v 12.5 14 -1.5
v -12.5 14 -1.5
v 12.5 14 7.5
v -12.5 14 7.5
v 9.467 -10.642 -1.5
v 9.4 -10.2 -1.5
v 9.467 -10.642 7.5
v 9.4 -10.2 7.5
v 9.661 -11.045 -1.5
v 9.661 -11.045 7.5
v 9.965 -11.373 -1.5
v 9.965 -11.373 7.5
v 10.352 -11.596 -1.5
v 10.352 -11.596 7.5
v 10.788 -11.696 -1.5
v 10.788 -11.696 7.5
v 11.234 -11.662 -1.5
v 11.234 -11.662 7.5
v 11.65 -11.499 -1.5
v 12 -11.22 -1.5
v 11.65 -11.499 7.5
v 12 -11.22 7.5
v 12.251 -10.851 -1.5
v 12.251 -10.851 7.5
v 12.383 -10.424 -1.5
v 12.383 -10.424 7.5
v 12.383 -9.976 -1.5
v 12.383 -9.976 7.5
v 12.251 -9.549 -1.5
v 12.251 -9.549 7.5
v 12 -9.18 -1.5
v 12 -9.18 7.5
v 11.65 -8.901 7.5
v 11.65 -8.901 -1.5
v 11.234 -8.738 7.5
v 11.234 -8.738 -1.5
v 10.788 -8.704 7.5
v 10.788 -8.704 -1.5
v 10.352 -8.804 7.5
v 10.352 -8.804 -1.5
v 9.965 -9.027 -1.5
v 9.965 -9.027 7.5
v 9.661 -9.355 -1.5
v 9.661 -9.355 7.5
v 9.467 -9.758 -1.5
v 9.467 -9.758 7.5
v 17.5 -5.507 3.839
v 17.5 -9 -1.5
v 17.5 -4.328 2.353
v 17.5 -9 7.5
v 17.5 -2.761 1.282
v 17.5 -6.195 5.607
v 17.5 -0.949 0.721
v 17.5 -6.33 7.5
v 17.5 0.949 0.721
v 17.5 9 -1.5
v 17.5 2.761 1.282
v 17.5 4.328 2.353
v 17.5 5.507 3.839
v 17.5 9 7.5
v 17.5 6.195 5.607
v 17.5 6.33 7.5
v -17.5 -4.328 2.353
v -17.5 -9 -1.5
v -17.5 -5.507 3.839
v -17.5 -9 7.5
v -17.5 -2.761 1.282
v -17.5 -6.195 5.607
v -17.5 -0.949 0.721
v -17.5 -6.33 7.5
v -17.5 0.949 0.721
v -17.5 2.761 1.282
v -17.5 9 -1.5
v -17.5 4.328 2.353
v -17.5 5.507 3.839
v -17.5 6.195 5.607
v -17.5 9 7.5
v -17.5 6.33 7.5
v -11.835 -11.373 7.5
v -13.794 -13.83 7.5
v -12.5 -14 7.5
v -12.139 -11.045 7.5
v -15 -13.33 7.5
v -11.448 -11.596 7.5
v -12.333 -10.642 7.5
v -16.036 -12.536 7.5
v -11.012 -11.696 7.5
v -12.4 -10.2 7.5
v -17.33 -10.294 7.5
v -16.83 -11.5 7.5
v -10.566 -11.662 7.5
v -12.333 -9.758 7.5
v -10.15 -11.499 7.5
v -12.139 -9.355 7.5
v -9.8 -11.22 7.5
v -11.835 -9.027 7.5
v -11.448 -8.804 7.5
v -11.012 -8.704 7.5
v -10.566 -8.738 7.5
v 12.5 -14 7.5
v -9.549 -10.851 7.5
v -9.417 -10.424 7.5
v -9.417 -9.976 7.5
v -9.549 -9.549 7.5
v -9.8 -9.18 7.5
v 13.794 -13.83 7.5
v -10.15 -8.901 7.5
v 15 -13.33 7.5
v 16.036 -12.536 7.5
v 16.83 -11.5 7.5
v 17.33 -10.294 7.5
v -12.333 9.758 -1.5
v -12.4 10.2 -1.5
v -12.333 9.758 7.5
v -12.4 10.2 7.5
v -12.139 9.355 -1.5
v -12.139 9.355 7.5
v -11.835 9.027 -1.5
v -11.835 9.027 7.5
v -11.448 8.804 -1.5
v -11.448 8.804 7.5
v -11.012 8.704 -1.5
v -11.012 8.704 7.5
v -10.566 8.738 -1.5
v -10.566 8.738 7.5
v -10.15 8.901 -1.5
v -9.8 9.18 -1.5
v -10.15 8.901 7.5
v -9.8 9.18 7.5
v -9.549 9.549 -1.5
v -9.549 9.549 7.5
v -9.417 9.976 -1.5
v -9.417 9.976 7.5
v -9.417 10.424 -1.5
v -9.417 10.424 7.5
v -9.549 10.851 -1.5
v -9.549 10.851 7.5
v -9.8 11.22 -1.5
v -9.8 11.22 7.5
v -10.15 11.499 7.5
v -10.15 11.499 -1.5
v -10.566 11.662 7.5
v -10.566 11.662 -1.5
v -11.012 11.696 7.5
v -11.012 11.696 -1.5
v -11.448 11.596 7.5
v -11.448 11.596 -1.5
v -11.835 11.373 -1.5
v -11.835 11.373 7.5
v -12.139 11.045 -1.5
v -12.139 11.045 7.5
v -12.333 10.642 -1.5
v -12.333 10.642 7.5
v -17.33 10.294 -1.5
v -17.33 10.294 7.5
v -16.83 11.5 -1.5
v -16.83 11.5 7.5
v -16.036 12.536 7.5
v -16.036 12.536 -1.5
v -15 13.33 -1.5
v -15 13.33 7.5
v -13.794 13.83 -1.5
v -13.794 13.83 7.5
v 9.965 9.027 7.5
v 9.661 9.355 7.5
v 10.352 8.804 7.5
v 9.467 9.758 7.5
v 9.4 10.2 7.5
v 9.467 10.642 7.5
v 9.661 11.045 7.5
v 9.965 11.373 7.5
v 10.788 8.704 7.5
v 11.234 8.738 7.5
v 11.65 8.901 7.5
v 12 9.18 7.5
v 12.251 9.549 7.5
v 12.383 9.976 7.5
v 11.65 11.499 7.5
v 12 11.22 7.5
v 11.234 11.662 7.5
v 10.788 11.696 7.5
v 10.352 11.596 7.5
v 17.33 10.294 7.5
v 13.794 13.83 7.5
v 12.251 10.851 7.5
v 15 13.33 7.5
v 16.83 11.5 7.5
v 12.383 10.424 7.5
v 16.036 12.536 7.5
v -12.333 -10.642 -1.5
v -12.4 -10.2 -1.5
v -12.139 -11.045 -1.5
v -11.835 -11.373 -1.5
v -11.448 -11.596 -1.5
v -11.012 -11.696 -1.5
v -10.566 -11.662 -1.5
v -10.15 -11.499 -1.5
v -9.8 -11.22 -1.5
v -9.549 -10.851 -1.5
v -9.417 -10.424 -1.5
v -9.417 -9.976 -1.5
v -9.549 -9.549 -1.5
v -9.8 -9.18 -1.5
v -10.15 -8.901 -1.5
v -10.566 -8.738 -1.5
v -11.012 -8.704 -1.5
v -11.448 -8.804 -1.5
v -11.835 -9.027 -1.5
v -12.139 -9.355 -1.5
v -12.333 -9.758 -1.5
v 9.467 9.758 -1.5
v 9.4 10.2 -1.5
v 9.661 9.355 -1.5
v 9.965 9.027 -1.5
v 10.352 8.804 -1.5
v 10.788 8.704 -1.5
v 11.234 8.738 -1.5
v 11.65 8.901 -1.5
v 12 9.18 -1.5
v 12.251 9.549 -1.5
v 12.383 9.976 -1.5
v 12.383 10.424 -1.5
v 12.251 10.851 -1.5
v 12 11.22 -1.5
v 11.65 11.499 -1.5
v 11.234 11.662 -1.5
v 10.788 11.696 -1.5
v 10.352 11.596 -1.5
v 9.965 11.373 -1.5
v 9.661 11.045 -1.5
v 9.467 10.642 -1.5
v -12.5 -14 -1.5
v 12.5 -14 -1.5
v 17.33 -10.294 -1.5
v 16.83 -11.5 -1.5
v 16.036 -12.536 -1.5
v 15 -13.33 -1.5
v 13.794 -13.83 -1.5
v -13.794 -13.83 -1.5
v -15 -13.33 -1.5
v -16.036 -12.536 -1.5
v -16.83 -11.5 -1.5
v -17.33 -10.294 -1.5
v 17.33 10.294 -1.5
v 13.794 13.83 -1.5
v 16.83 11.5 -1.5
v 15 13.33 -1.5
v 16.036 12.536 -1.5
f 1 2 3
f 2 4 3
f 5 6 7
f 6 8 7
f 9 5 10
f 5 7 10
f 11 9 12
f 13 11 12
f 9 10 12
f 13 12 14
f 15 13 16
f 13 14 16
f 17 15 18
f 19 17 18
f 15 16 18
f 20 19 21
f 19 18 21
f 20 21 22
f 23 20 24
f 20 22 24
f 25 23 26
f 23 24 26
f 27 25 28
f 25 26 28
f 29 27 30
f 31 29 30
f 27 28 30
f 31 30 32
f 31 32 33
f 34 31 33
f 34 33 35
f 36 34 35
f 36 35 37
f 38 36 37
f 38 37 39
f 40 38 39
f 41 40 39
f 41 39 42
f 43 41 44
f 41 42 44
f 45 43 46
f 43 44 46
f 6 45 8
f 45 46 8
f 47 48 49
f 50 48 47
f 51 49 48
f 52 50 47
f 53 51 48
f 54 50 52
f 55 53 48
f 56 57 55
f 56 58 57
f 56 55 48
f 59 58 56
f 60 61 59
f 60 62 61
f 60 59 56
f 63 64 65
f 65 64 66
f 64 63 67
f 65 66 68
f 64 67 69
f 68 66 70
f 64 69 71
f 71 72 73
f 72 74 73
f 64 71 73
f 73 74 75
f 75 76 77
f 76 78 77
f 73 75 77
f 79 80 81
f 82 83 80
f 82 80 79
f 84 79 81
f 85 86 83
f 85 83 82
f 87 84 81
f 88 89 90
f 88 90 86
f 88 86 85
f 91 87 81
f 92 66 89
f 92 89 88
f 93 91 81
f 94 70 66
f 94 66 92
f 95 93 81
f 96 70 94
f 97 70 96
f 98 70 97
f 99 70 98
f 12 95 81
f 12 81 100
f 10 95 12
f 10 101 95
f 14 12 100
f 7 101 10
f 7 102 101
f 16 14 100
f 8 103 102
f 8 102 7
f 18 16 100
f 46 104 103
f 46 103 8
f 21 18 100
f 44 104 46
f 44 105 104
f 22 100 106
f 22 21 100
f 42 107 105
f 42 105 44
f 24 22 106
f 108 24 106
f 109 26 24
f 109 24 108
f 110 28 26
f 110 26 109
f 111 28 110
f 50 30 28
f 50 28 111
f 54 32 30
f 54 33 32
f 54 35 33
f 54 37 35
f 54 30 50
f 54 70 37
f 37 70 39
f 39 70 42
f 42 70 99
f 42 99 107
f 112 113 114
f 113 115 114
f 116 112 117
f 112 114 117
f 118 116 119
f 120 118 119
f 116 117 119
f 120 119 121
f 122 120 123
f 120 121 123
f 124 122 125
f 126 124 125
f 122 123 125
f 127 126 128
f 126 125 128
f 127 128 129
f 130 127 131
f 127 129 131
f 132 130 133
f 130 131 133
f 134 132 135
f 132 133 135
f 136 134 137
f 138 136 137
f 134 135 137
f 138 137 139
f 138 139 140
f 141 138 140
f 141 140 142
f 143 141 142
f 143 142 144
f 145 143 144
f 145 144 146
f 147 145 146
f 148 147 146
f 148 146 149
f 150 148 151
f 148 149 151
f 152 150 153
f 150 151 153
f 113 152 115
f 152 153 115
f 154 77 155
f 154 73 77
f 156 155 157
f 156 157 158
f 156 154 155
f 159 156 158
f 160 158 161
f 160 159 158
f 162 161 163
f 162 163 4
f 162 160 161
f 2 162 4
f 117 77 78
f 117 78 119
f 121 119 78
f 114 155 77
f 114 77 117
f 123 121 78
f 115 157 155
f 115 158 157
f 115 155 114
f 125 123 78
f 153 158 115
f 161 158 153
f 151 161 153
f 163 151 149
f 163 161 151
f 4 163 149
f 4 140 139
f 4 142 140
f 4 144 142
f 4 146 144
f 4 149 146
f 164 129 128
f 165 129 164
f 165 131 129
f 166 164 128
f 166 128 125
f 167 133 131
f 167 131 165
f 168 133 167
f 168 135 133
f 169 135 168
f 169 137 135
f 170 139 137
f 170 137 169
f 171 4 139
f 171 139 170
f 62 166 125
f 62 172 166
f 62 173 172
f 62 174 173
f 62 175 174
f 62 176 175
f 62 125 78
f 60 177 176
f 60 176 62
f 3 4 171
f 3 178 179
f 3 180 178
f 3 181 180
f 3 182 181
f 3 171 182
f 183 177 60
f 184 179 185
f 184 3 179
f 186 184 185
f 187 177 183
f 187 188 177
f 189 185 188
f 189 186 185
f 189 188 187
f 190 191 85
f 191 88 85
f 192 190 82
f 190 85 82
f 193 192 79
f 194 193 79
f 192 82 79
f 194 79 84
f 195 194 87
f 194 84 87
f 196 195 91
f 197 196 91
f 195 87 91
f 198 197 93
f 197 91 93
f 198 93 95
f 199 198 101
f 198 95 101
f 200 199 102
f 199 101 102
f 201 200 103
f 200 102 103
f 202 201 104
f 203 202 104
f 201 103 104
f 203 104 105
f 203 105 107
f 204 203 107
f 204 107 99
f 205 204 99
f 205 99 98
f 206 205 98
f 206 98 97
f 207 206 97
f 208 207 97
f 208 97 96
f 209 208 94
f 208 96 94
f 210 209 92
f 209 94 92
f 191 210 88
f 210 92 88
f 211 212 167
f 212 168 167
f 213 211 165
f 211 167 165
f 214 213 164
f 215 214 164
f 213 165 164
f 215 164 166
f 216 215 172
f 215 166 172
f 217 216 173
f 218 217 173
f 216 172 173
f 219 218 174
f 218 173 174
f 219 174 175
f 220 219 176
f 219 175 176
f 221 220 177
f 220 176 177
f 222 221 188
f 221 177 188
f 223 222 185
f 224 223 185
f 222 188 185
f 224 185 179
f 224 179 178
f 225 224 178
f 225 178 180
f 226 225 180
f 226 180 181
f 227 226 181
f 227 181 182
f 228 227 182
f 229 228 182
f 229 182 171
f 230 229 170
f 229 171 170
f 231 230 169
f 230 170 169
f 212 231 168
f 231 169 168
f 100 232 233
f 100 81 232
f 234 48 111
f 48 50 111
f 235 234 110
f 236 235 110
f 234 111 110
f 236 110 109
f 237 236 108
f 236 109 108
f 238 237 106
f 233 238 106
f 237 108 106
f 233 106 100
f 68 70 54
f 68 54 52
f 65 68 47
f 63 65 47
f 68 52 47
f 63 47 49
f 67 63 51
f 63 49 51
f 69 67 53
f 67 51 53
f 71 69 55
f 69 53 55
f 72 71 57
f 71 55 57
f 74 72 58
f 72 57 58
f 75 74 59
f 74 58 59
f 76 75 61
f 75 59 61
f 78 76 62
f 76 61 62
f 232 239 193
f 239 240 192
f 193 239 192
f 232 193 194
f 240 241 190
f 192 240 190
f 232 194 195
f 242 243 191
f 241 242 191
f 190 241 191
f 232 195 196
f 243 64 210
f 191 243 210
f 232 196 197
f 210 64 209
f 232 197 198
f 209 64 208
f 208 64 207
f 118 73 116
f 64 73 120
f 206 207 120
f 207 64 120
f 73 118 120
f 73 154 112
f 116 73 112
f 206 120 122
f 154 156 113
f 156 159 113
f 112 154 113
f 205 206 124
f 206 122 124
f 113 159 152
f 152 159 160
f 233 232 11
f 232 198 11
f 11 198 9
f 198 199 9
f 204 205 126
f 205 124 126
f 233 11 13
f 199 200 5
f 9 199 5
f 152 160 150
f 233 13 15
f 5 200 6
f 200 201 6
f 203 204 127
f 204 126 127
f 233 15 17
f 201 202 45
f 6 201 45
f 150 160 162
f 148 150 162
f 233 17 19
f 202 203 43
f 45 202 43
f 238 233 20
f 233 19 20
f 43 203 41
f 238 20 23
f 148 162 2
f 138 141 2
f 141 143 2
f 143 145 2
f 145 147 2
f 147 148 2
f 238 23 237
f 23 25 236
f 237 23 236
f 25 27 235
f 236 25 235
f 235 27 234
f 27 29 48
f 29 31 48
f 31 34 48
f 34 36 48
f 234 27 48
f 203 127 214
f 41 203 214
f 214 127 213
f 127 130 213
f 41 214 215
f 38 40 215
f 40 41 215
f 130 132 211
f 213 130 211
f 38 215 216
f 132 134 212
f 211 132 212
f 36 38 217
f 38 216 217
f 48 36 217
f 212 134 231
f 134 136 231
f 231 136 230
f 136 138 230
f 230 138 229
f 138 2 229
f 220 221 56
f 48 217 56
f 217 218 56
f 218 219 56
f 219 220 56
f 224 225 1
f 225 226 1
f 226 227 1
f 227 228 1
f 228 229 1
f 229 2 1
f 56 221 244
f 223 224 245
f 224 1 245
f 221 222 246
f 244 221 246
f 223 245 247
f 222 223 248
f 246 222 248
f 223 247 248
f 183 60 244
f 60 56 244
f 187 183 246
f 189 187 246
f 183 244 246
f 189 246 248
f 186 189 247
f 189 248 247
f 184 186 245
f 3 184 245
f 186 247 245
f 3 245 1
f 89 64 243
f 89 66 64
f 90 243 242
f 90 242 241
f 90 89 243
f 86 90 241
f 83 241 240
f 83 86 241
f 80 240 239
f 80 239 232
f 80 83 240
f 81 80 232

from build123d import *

# Parameters (mm, degrees)
F0_W     = 35
F0_H     = 28
F1_DEPTH = 14
F3_D     = 12.7
F4_DEPTH = 6.5
F5_D     = 3
F6_DEPTH = 1.5
F7_R     = 5


with BuildPart() as f1:
    # F0 (on Top) → F1 (new body)
    with BuildSketch(Plane.XY):
        Rectangle(F0_W, F0_H)
    extrude(amount=F1_DEPTH)

    # F3 (through all)
    with Locations(Plane(origin=(-17.5, 0, 0), x_dir=(0, -1, 0), z_dir=(-1, 0, 0))):
        with Locations((0, 7)):
            Hole(F3_D / 2)

    # F4 (cut): a face of the model
    f4_faces = [f1.faces().sort_by_distance(p)[0] for p in [
        (0, 0, 14),
    ]]
    extrude(f4_faces, amount=-F4_DEPTH, mode=Mode.SUBTRACT)

    # F5 (through all)
    with Locations(Plane(origin=(0, 0, 0), x_dir=(1, 0, 0), z_dir=(0, 0, -1))):
        with Locations((10.9, -10.2), (-10.9, -10.2), (-10.9, 10.2), (10.9, 10.2)):
            Hole(F5_D / 2)

    # F6 (add): a face of the model
    f6_faces = [f1.faces().sort_by_distance(p)[0] for p in [
        (0, 0, 0),
    ]]
    extrude(f6_faces, amount=F6_DEPTH)

    # F7
    f7_edges = [f1.edges().sort_by_distance(p)[0] for p in [
        (-17.5, -14, 3),
        (-17.5, 14, 3),
        (17.5, 14, 3),
        (17.5, -14, 3),
    ]]
    fillet(f7_edges, radius=F7_R)


solid = f1.part
